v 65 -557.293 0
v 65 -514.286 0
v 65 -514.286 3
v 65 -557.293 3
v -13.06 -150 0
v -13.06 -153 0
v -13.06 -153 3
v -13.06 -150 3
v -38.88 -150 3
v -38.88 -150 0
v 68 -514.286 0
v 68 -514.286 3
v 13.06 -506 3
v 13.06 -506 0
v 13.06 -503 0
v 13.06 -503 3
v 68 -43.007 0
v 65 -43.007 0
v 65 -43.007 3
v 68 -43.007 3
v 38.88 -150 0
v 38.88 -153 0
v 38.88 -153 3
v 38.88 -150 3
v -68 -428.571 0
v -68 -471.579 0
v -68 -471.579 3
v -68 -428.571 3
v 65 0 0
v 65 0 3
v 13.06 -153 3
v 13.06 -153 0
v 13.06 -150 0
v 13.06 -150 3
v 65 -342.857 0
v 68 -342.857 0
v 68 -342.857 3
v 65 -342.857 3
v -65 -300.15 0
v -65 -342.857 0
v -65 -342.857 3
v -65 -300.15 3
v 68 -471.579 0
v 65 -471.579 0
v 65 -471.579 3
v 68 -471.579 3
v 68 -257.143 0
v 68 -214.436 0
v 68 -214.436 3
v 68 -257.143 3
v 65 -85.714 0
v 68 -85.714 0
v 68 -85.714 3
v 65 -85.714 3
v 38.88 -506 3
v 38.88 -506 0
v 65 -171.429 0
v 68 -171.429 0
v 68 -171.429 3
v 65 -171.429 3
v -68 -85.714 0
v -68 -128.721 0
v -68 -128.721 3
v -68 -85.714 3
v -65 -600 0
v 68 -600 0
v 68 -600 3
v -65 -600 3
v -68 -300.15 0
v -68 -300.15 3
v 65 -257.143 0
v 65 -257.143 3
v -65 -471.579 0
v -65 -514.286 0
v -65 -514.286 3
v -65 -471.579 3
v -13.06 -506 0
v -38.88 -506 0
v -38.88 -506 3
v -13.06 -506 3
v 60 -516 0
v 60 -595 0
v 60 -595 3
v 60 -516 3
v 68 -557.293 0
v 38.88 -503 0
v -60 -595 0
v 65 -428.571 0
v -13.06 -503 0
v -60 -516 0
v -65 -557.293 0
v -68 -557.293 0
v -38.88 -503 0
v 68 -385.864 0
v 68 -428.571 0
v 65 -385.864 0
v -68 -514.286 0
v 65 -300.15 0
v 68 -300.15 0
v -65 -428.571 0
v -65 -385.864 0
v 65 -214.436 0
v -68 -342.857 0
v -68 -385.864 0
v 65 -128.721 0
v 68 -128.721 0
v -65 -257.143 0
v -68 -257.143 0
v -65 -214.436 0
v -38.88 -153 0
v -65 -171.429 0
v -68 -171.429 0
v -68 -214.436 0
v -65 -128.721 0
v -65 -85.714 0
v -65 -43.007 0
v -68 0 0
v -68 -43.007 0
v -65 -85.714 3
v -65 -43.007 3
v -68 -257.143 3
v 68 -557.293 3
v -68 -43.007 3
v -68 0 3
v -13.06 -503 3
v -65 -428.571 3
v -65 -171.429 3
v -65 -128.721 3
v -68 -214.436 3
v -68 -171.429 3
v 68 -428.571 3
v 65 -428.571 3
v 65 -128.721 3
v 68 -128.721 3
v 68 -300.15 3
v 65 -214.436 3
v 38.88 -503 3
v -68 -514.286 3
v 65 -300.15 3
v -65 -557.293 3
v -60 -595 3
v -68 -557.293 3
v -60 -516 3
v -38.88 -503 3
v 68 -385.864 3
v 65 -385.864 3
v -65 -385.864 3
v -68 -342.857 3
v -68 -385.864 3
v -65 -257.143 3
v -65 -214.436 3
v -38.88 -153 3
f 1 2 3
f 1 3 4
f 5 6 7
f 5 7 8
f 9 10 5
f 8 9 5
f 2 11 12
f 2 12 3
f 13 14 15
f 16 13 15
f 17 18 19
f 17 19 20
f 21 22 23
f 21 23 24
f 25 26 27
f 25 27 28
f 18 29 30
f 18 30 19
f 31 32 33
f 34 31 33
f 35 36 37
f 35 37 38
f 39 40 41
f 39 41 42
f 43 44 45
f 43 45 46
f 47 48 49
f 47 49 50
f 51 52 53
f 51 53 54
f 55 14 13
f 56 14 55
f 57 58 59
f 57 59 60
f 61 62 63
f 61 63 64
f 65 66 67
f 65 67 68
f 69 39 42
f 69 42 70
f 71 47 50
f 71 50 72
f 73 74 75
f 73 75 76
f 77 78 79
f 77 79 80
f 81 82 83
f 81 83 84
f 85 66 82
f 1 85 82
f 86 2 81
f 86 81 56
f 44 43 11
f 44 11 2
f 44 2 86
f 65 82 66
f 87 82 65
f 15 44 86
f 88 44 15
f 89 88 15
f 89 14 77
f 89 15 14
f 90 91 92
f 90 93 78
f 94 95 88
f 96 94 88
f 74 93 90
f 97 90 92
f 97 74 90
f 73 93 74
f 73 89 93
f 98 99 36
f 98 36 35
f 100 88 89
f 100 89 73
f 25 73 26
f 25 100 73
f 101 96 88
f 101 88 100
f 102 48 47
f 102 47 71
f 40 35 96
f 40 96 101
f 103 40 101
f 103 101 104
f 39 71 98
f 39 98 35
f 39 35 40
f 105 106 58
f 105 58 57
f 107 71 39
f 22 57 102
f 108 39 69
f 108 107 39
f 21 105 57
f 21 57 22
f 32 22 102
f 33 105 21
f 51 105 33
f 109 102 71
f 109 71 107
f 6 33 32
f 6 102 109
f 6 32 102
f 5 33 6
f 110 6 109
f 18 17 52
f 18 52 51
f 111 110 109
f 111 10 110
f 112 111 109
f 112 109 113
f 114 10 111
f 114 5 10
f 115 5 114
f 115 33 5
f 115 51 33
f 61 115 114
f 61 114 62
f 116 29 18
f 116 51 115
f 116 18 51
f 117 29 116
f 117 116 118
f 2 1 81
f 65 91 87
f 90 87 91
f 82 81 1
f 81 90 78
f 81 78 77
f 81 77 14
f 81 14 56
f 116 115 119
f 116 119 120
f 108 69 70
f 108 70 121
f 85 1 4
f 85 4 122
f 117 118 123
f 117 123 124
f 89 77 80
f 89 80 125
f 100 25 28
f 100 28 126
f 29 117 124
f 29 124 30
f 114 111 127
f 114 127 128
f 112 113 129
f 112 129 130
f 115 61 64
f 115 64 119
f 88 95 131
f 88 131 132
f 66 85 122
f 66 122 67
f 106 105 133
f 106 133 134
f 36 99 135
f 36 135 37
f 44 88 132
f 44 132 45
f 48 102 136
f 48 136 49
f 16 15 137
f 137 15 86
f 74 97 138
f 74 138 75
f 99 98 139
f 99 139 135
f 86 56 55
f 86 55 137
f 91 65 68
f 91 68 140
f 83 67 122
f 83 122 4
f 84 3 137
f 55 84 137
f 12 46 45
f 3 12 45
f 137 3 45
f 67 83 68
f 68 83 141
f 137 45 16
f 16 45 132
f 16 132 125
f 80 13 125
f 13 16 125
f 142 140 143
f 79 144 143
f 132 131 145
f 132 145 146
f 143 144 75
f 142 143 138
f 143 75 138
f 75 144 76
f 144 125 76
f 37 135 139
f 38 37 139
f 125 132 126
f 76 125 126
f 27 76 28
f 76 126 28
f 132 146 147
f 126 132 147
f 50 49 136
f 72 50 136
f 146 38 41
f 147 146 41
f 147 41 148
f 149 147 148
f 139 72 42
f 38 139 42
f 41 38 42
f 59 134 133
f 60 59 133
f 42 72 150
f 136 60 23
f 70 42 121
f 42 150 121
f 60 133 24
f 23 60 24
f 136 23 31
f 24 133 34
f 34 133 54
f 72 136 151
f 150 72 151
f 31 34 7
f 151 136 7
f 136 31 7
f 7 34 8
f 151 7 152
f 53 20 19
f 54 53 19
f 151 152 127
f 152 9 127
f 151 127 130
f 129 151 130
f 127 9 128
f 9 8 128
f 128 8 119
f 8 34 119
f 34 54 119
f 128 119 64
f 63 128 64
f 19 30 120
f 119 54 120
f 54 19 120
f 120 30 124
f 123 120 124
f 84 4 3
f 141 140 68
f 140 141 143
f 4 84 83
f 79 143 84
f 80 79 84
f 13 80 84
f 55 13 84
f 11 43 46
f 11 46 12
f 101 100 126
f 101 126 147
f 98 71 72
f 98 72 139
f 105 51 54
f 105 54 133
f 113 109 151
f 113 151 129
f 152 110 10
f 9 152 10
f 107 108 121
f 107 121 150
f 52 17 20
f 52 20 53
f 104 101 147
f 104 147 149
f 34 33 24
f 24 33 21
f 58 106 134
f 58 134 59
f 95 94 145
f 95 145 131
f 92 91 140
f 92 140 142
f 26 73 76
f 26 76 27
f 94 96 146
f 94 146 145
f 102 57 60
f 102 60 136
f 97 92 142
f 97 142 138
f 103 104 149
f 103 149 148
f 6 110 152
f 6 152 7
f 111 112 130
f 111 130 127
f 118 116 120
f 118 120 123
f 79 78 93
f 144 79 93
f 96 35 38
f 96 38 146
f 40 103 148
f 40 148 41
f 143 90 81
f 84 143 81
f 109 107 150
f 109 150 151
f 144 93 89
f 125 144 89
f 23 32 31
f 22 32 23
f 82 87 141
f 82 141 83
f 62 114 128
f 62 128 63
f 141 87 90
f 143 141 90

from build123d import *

# Parameters (mm, degrees)
SKETCH1_W           = 120
SKETCH1_H           = 79
SKETCH1_W_2         = 25.82
SKETCH1_H_2         = 3
BOSS_EXTRUDE1_DEPTH = 3


with BuildPart() as part:
    # Sketch1 → Boss-Extrude1 (new body)
    with BuildSketch(Plane.XY):
        Polygon((-68, 0), (65, 0), (65, -43.007142857), (68, -43.007142857), (68, -85.714285714), (65, -85.714285714), (65, -128.721428571), (68, -128.721428571), (68, -171.428571429), (65, -171.428571429), (65, -214.435714286), (68, -214.435714286), (68, -257.142857143), (65, -257.142857143), (65, -300.15), (68, -300.15), (68, -342.857142857), (65, -342.857142857), (65, -385.864285714), (68, -385.864285714), (68, -428.571428571), (65, -428.571428571), (65, -471.578571429), (68, -471.578571429), (68, -514.285714286), (65, -514.285714286), (65, -557.292857143), (68, -557.292857143), (68, -600), (-65, -600), (-65, -557.292857143), (-68, -557.292857143), (-68, -514.285714286), (-65, -514.285714286), (-65, -471.578571429), (-68, -471.578571429), (-68, -428.571428571), (-65, -428.571428571), (-65, -385.864285714), (-68, -385.864285714), (-68, -342.857142857), (-65, -342.857142857), (-65, -300.15), (-68, -300.15), (-68, -257.142857143), (-65, -257.142857143), (-65, -214.435714286), (-68, -214.435714286), (-68, -171.428571429), (-65, -171.428571429), (-65, -128.721428571), (-68, -128.721428571), (-68, -85.714285714), (-65, -85.714285714), (-65, -43.007142857), (-68, -43.007142857), align=None)
        with Locations((0, -555.5)):
            Rectangle(SKETCH1_W, SKETCH1_H, mode=Mode.SUBTRACT)
        with Locations((-25.97, -151.5)):
            Rectangle(SKETCH1_W_2, SKETCH1_H_2, mode=Mode.SUBTRACT)
        with Locations((25.97, -151.5)):
            Rectangle(SKETCH1_W_2, SKETCH1_H_2, mode=Mode.SUBTRACT)
        with Locations((-25.97, -504.5)):
            Rectangle(SKETCH1_W_2, SKETCH1_H_2, mode=Mode.SUBTRACT)
        with Locations((25.97, -504.5)):
            Rectangle(SKETCH1_W_2, SKETCH1_H_2, mode=Mode.SUBTRACT)
    extrude(amount=BOSS_EXTRUDE1_DEPTH)


solid = part.part
